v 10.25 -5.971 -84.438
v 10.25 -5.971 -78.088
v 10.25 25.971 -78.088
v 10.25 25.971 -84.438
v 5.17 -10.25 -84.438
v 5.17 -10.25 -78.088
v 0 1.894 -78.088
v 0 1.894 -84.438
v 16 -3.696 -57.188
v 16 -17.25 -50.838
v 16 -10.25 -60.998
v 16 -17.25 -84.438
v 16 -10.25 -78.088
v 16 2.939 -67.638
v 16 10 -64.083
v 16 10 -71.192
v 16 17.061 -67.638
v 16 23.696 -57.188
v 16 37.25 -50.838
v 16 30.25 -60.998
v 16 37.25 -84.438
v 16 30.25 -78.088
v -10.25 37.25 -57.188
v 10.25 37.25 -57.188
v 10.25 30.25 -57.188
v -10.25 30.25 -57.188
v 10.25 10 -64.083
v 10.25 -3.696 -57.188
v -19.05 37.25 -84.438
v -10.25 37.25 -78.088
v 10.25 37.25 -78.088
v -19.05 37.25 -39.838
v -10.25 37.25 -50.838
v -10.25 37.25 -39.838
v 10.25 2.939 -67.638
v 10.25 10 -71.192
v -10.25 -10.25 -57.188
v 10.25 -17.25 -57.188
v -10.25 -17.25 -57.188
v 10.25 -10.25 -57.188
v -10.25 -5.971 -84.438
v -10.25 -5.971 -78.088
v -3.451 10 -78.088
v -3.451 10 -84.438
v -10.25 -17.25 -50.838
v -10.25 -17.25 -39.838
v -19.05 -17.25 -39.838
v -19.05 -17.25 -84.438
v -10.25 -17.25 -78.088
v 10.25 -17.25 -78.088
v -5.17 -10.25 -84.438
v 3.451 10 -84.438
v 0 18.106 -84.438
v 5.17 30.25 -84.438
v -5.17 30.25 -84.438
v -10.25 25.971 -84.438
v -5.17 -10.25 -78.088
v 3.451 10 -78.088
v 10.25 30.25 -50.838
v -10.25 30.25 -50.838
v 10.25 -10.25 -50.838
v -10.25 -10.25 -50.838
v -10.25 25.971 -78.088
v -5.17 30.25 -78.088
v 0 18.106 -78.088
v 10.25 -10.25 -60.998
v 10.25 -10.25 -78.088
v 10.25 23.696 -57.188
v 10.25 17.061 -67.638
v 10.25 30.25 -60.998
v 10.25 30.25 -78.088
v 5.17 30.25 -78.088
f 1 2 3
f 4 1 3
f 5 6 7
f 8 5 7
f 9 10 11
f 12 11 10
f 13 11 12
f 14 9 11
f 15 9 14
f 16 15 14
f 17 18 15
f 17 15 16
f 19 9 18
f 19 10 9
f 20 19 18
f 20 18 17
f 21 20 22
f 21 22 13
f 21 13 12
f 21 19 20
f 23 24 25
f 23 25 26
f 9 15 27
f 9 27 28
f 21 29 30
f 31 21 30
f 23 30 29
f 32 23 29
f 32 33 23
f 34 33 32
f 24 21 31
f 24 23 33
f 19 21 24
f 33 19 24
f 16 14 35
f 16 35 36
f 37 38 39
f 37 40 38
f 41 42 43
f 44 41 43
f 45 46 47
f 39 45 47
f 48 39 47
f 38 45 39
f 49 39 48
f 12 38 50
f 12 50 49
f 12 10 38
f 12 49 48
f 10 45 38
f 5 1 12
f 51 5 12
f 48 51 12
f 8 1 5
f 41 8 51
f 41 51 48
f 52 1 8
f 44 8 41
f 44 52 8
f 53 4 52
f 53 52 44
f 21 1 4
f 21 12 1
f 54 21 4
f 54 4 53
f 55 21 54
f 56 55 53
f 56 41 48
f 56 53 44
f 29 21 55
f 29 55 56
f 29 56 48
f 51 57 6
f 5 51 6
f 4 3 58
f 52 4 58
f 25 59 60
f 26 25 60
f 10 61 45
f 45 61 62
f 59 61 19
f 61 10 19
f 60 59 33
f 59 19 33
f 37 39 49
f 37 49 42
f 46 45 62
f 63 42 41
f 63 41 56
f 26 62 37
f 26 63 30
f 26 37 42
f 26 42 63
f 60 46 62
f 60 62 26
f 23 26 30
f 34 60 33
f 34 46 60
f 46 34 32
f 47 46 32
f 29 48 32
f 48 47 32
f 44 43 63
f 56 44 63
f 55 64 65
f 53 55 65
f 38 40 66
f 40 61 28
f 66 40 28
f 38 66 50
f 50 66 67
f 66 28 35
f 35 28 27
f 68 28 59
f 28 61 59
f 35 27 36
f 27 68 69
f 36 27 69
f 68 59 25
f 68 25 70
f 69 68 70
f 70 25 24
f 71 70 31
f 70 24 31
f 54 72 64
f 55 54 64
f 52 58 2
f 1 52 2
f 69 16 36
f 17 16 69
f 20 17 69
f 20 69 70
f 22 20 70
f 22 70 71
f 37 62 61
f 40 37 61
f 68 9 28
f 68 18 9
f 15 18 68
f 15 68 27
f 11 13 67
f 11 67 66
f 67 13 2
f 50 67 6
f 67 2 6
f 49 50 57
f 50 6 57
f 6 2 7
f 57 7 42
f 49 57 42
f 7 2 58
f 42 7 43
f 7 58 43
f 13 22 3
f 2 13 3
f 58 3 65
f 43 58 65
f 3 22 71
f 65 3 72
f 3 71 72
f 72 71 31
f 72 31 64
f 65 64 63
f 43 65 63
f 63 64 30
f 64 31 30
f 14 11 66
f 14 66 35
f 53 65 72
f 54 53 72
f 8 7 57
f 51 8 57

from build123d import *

# Parameters (mm, degrees)
BOSS_EXTRUDE2_DEPTH      = 0.25
BOSS_EXTRUDE2_DEPTH_BACK = 38
SKETCH1_W                = 8.8
SKETCH1_H                = 54.5
BOSS_EXTRUDE3_DEPTH      = 6.35
SKETCH3_W                = 5.75
SKETCH3_H                = 54.5
BOSS_EXTRUDE4_DEPTH      = 6.35
BOSS_EXTRUDE5_DEPTH      = 5.75


with BuildPart() as part:
    # Sketch1 → Boss-Extrude2 (new, two sides: drawn at the far end of the back side and taken through both)
    with BuildSketch(Plane(origin=(0, 0, -77.8375), x_dir=(-1, 0, 0), z_dir=(0, 0, -1)).offset(-BOSS_EXTRUDE2_DEPTH_BACK)):
        with Locations((14.65, 10)):
            Rectangle(SKETCH1_W, SKETCH1_H)
    extrude(amount=BOSS_EXTRUDE2_DEPTH + BOSS_EXTRUDE2_DEPTH_BACK)

    # Sketch2 → Boss-Extrude3 (add)
    with BuildSketch(Plane(origin=(0, 0, -50.8375), x_dir=(-1, 0, 0), z_dir=(0, 0, -1))):
        Polygon((10.25, -17.25), (10.25, -10.25), (-10.25, -10.25), (-10.25, 30.25), (10.25, 30.25), (10.25, 37.25), (-16, 37.25), (-16, -17.25), align=None)
    extrude(amount=BOSS_EXTRUDE3_DEPTH)

    # Sketch3 → Boss-Extrude4 (add)
    with BuildSketch(Plane(origin=(0, 0, -78.0875), x_dir=(-1, 0, 0), z_dir=(0, 0, -1))):
        Polygon((10.25, 30.25), (10.25, 37.25), (-10.25, 37.25), (-10.25, 30.25), (-5.17, 30.25), (5.17, 30.25), align=None)
        with Locations((-13.125, 10)):
            Rectangle(SKETCH3_W, SKETCH3_H)
        Polygon((19.05, -17.25), (19.05, 37.25), (10.25, 37.25), (10.25, 30.25), (10.25, 25.971389376), (10.25, -5.971389376), (10.25, -10.25), (10.25, -17.25), align=None)
        Polygon((10.25, 25.971389376), (10.25, 30.25), (5.17, 30.25), (0, 18.105733912), (3.450735024, 10), align=None)
        Polygon((-5.17, 30.25), (-10.25, 30.25), (-10.25, 25.971389376), (-3.450735024, 10), (0, 18.105733912), align=None)
        Polygon((0, 1.894266088), (3.450735024, 10), (0, 18.105733912), (-3.450735024, 10), align=None)
        Polygon((-10.25, -5.971389376), (-10.25, -10.25), (-5.17, -10.25), (0, 1.894266088), (-3.450735024, 10), align=None)
        Polygon((5.17, -10.25), (10.25, -10.25), (10.25, -5.971389376), (3.450735024, 10), (0, 1.894266088), align=None)
        Polygon((-10.25, -17.25), (10.25, -17.25), (10.25, -10.25), (5.17, -10.25), (-5.17, -10.25), (-10.25, -10.25), align=None)
    extrude(amount=BOSS_EXTRUDE4_DEPTH)

    # Sketch4 → Boss-Extrude5 (add)
    with BuildSketch(Plane(origin=(16, 0, 0), x_dir=(0, 0, -1), z_dir=(1, 0, 0))):
        Polygon((67.6375, 2.939263745), (64.082844513, 10), (57.1875, -3.696463464), (57.1875, -10.25), (60.9975, -10.25), align=None)
        Polygon((60.9975, -10.25), (57.1875, -10.25), (57.1875, -17.25), (78.0875, -17.25), (78.0875, -10.25), (74.2775, -10.25), align=None)
        Polygon((71.192155487, 10), (67.6375, 17.060736255), (64.082844513, 10), (67.6375, 2.939263745), align=None)
        Polygon((78.0875, 37.25), (57.1875, 37.25), (57.1875, 30.25), (60.9975, 30.25), (74.2775, 30.25), (78.0875, 30.25), align=None)
        Polygon((60.9975, 30.25), (57.1875, 30.25), (57.1875, 23.696463464), (64.082844513, 10), (67.6375, 17.060736255), align=None)
    extrude(amount=-BOSS_EXTRUDE5_DEPTH)


solid = part.part
